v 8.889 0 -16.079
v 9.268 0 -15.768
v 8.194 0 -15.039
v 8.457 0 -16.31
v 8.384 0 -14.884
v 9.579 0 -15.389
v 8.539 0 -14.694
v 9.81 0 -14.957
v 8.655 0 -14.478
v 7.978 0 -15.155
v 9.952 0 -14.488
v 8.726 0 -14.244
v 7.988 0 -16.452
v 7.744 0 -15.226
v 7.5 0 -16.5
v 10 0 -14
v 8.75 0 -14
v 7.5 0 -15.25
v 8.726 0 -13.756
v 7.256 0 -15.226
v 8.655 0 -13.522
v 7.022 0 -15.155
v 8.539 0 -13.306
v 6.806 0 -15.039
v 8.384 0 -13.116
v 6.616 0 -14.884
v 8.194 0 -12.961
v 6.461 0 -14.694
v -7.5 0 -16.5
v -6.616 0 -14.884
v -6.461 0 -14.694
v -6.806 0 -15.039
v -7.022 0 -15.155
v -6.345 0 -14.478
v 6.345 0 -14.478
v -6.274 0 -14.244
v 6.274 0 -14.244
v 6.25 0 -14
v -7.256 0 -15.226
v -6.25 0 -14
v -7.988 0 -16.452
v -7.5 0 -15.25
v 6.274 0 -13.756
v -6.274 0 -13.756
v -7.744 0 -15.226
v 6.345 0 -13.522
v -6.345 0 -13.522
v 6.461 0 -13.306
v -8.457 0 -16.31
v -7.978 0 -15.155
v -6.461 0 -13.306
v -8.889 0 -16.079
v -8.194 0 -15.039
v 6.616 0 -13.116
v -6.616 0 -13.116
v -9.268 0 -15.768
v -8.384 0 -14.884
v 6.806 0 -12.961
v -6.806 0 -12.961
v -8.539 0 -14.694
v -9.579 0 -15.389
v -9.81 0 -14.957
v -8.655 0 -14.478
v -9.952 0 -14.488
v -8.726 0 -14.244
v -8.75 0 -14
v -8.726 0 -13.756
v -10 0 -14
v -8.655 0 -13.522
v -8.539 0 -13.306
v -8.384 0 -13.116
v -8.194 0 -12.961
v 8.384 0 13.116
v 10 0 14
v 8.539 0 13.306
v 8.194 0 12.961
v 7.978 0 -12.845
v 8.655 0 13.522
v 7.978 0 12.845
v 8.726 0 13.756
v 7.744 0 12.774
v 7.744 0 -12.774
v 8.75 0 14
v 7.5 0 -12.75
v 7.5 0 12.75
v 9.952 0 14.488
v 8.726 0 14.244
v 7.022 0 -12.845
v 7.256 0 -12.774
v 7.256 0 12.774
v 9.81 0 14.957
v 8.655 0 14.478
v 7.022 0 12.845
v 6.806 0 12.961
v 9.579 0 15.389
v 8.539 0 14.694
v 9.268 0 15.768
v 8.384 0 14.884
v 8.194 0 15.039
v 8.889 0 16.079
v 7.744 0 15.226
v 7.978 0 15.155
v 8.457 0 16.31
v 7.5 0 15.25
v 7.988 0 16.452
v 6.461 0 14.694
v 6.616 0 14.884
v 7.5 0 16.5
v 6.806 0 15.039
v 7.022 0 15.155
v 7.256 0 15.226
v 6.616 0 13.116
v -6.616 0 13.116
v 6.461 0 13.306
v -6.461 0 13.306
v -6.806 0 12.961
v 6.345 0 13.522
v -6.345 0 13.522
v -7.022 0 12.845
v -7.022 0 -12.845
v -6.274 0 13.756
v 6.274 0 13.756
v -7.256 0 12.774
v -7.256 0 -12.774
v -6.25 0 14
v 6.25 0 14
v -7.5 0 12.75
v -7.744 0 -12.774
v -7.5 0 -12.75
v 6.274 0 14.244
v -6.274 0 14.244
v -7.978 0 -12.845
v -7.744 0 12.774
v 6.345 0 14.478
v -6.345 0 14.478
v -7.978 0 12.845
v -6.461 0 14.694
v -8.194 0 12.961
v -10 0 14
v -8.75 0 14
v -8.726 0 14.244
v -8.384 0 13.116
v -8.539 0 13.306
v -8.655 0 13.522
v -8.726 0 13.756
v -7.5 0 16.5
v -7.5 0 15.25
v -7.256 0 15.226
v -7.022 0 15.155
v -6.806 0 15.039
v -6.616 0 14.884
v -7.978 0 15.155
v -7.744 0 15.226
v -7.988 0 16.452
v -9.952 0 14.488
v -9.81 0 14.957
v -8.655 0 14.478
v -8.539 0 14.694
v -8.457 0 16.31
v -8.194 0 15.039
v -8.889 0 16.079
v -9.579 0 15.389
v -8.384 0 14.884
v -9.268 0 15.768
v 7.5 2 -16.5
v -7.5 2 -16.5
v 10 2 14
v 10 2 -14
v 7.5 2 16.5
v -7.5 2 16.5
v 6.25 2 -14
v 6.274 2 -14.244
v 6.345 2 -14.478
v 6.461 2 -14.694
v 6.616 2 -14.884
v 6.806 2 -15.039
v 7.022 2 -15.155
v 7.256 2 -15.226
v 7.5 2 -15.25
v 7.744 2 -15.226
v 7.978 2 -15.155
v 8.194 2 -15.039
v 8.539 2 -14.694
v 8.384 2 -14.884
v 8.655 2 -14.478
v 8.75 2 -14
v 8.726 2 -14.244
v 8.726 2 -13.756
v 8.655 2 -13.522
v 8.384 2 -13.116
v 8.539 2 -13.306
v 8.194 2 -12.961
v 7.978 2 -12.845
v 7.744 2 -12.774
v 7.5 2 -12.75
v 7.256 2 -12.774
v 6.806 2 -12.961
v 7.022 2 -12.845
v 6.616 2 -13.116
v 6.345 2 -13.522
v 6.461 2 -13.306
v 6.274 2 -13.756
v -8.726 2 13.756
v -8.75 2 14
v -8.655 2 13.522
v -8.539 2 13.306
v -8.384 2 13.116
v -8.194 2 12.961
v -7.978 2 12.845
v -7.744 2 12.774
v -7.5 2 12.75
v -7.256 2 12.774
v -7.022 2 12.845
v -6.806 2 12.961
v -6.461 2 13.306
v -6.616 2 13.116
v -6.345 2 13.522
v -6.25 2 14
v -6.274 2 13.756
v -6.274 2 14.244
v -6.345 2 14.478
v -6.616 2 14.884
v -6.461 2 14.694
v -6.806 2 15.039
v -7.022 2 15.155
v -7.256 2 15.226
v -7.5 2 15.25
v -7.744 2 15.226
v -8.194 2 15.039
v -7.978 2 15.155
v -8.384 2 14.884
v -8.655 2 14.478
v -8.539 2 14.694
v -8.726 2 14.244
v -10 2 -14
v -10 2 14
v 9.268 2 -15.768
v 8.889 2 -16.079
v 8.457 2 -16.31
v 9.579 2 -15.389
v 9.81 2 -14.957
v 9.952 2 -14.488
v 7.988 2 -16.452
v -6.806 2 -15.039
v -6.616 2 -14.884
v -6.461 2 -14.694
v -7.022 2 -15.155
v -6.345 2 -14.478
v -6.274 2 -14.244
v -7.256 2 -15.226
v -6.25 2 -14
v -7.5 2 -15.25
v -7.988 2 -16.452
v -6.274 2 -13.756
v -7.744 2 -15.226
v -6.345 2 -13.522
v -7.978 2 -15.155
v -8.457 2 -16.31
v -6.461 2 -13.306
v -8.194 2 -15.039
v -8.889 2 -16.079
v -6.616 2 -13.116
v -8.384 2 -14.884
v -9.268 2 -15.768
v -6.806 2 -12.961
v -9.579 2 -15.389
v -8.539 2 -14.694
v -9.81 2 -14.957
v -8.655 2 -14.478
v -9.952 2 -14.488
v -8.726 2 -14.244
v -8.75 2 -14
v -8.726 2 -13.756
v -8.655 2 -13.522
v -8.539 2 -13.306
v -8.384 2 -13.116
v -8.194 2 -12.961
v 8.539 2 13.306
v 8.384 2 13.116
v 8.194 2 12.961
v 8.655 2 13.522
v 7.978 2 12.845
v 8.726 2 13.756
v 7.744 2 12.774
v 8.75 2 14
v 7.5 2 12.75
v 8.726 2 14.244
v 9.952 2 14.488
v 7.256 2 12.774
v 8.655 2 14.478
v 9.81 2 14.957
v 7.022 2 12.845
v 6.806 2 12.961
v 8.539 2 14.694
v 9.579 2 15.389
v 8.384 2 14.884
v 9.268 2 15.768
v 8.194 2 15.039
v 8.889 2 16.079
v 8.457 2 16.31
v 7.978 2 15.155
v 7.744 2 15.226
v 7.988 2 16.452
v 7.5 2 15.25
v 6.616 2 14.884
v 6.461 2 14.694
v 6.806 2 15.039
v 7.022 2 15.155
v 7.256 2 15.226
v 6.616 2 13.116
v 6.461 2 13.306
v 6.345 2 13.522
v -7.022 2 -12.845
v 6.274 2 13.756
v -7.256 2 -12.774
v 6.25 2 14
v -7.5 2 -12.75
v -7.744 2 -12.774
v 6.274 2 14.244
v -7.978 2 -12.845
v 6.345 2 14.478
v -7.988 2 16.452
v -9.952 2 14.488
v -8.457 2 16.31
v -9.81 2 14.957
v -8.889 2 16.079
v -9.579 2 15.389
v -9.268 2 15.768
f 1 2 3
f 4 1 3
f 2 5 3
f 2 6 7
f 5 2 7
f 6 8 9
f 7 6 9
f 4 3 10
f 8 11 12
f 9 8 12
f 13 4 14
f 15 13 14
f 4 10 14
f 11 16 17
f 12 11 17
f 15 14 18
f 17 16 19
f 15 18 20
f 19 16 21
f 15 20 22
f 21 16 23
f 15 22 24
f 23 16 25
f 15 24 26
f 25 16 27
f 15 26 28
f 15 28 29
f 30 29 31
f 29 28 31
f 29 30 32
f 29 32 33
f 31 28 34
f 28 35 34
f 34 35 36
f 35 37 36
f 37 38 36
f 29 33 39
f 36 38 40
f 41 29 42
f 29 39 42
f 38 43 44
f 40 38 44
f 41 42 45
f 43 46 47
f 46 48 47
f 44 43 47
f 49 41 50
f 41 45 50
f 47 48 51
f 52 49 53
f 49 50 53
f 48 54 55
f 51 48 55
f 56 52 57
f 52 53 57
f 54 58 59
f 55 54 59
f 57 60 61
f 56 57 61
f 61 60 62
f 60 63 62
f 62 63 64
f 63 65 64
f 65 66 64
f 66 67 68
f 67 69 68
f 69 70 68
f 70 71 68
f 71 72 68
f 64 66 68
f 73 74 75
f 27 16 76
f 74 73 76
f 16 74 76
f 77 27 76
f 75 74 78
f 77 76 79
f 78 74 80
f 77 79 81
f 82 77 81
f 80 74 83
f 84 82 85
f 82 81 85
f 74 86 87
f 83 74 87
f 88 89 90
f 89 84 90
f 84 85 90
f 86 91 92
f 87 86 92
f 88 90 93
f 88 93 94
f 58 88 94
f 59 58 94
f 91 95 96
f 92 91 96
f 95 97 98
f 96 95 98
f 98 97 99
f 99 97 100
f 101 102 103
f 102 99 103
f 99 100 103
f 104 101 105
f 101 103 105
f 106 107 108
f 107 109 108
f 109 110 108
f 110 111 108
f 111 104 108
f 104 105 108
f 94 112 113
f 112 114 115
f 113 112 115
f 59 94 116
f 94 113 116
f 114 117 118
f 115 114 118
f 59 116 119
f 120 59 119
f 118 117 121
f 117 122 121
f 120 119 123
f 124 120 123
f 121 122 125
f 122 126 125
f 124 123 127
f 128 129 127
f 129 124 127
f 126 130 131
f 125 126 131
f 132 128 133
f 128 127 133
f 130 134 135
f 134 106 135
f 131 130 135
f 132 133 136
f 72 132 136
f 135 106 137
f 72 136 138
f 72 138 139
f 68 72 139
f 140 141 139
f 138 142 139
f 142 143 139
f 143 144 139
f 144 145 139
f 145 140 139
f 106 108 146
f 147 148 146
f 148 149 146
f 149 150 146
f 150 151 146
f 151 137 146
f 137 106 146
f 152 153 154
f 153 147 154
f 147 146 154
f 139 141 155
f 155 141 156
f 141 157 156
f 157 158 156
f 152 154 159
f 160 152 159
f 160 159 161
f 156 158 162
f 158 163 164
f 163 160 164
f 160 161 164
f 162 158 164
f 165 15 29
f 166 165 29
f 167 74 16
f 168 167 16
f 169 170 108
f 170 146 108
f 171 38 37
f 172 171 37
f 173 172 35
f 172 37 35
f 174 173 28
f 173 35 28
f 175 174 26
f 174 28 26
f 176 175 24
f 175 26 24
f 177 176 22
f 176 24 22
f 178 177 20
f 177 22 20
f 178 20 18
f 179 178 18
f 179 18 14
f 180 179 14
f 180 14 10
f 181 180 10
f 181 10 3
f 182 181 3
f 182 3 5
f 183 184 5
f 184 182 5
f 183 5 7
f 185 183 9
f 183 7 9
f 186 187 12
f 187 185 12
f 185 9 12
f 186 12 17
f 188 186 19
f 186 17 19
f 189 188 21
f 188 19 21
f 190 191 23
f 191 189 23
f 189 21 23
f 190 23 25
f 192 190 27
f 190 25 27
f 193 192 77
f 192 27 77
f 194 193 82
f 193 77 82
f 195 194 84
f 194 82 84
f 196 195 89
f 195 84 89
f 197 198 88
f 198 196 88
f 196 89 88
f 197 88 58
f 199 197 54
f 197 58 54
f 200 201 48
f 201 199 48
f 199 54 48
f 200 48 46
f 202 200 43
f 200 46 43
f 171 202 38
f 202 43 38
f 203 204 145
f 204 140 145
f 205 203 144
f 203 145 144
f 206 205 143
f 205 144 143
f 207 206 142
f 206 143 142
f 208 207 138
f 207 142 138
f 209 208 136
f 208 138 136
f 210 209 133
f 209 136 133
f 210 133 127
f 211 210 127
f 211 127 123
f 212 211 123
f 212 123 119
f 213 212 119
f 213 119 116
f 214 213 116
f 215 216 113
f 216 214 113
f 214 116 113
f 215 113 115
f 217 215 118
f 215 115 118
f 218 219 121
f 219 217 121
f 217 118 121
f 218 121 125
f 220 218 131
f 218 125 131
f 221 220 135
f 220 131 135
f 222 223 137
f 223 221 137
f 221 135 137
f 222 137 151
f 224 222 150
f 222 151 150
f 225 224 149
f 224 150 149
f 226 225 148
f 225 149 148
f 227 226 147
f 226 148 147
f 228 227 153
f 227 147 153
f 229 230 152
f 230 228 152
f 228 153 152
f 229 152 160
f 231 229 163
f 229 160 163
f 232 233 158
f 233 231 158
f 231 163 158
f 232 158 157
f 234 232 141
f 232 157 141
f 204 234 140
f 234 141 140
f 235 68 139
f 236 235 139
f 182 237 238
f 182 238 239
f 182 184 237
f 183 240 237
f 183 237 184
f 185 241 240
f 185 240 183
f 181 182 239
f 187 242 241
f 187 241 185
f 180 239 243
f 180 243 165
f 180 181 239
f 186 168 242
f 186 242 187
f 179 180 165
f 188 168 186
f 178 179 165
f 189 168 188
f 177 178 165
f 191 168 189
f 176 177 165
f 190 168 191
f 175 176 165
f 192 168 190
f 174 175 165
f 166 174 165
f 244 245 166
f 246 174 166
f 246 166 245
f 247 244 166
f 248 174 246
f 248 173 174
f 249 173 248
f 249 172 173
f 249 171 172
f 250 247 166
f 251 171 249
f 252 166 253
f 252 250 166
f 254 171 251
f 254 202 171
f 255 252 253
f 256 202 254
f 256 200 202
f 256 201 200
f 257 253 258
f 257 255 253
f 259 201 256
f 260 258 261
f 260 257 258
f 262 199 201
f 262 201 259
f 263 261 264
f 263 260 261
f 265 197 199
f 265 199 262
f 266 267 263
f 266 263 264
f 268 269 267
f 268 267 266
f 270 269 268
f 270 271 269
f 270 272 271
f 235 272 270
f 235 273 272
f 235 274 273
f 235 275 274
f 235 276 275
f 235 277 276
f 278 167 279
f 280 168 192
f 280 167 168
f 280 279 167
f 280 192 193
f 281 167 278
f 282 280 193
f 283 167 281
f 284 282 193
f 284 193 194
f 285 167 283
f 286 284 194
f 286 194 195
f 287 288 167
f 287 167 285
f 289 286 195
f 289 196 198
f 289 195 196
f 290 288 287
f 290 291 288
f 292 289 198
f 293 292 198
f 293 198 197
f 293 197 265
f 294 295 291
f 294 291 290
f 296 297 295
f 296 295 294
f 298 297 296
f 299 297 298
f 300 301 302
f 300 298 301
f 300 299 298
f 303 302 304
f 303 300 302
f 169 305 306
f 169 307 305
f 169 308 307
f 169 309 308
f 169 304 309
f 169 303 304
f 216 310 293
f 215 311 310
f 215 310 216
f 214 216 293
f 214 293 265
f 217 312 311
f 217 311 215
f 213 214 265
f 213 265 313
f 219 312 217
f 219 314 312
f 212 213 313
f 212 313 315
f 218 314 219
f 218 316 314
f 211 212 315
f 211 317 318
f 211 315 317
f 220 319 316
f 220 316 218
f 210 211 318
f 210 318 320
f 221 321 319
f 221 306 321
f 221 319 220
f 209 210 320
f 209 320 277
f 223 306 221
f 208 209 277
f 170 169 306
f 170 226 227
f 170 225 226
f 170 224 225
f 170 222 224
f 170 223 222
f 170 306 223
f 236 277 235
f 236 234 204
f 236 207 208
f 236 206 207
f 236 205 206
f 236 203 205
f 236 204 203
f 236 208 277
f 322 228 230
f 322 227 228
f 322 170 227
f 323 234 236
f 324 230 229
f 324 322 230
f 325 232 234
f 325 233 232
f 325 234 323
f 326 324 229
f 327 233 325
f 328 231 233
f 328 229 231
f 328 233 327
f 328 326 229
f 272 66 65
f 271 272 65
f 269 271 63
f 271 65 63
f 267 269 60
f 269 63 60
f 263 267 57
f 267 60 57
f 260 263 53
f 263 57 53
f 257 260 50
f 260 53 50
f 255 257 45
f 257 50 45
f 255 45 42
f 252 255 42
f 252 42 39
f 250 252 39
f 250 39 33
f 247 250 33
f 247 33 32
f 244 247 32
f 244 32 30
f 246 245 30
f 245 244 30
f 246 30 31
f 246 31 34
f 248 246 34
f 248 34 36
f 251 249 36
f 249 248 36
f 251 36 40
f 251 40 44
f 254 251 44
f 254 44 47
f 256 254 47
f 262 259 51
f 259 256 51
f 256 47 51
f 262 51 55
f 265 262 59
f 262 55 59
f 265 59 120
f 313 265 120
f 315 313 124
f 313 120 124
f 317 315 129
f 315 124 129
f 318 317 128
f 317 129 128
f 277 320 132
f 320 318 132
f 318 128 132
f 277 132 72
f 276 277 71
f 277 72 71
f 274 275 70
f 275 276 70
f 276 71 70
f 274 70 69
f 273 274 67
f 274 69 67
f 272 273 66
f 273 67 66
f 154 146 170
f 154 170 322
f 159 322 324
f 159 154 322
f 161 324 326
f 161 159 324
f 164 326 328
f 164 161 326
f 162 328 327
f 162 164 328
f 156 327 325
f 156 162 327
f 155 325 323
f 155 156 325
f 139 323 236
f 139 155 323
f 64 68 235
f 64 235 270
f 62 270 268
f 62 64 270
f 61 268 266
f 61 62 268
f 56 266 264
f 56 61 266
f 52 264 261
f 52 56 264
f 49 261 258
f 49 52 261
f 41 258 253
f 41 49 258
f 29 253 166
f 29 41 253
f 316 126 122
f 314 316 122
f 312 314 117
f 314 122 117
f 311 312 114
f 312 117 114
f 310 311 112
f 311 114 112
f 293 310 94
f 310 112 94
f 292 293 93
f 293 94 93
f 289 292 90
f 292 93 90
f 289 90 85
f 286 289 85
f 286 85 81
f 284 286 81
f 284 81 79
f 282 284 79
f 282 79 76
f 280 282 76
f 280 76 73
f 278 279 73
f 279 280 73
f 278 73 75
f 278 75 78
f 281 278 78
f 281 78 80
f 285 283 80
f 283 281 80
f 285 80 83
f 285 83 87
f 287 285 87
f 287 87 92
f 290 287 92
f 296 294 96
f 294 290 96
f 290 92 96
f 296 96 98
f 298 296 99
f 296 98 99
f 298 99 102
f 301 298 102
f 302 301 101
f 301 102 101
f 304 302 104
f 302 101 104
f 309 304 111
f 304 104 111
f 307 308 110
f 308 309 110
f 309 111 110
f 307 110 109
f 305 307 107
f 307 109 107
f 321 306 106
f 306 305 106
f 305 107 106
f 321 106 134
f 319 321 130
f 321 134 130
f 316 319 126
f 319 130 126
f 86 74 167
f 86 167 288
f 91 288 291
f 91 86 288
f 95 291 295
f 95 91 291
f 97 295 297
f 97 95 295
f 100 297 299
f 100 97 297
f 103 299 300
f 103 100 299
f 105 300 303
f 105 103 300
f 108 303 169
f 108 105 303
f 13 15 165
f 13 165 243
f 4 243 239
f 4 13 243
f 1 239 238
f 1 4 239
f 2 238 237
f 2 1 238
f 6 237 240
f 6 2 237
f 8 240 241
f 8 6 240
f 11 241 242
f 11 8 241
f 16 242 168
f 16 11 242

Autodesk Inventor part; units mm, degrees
ref_plane "YZ Plane" through (0, 0, 0) normal (1, 0, 0) x (0, 1, 0)
ref_plane "XZ Plane" through (0, 0, 0) normal (0, 1, 0) x (-1, 0, 0)
ref_plane "XY Plane" through (0, 0, 0) normal (0, 0, 1) x (1, 0, 0)
sketch "Sketch1" plane through (0, 0, 0) normal (0, 1, 0) x (-1, 0, 0)
  line L0 (-10, 14) -> (-10, -14)
  line L1 (-7.5, -16.5) -> (7.5, -16.5)
  line L2 (10, -14) -> (10, 14)
  line L3 (7.5, 16.5) -> (-7.5, 16.5)
  line L4 (-10, 16.5) -> (10, -16.5) construction
  line L5 (-10, -16.5) -> (10, 16.5) construction
  arc A0 (10, 14) -> (7.5, 16.5) centre (7.5, 14) ccw
  arc A1 (7.5, -16.5) -> (10, -14) centre (7.5, -14) ccw
  arc A2 (-10, -14) -> (-7.5, -16.5) centre (-7.5, -14) ccw
  arc A3 (-7.5, 16.5) -> (-10, 14) centre (-7.5, 14) ccw
  circle A4 centre (7.5, 14) radius 1.25
  circle A5 centre (-7.5, 14) radius 1.25
  circle A6 centre (-7.5, -14) radius 1.25
  circle A7 centre (7.5, -14) radius 1.25
  point P0 (0, 0)
  dimension "d0" = 33
  dimension "d1" = 20
  dimension "d2" = 2.5
  dimension "d3" = 2.5
  dimension "d4" = 2.5
  dimension "d5" = 2.5
  dimension "d6" = 2.5
extrude "Extrusion1" add sketch "Sketch1" along normal blind 2
sketch "Sketch2" plane through (0, 2, 0) normal (0, 1, 0) x (1, 0, 0)
  line L0 (-17.9692, -32.7187) -> (-17.5216, 33.3599) construction
  line L1 (-17.5216, 33.3599) -> (32.0714, 33.0239) construction
  line L2 (32.0714, 33.0239) -> (31.6238, -33.0546) construction
  line L3 (31.6238, -33.0546) -> (-17.9692, -32.7187) construction
  circle A0 centre (-7.5, 14) radius 1.25 projected
  circle A1 centre (7.5, 14) radius 1.25 projected
  circle A2 centre (7.5, -14) radius 1.25 projected
  circle A3 centre (-7.5, -14) radius 1.25 projected
  line L4 (-10, 14) -> (-10, -14) projected
  arc A4 (-10, -14) -> (-7.5, -16.5) centre (-7.5, -14) ccw projected
  line L5 (-7.5, -16.5) -> (7.5, -16.5) projected
  arc A5 (7.5, -16.5) -> (10, -14) centre (7.5, -14) ccw projected
  line L6 (10, -14) -> (10, 14) projected
  arc A6 (10, 14) -> (7.5, 16.5) centre (7.5, 14) ccw projected
  line L7 (7.5, 16.5) -> (-7.5, 16.5) projected
  arc A7 (-7.5, 16.5) -> (-10, 14) centre (-7.5, 14) ccw projected
  point P0 (0, 0)
decal "Decal1"
sketch "Sketch3" plane through (0, 0, 0) normal (0, -1, 0) x (1, 0, 0)
  circle A0 centre (-7.5, -14) radius 1.25 projected
  circle A1 centre (7.5, -14) radius 1.25 projected
  circle A2 centre (7.5, 14) radius 1.25 projected
  circle A3 centre (-7.5, 14) radius 1.25 projected
  line L0 (-10, 14) -> (-10, -14) projected
  arc A4 (-10, -14) -> (-7.5, -16.5) centre (-7.5, -14) ccw projected
  line L1 (-7.5, -16.5) -> (7.5, -16.5) projected
  arc A5 (7.5, -16.5) -> (10, -14) centre (7.5, -14) ccw projected
  line L2 (10, -14) -> (10, 14) projected
  arc A6 (10, 14) -> (7.5, 16.5) centre (7.5, 14) ccw projected
  line L3 (7.5, 16.5) -> (-7.5, 16.5) projected
  arc A7 (-7.5, 16.5) -> (-10, 14) centre (-7.5, 14) ccw projected
  line L4 (-25.6164, -20.5771) -> (-25.6164, 49.1548) construction
  line L5 (-25.6164, 49.1548) -> (26.7185, 49.1548) construction
  line L6 (26.7185, 49.1548) -> (26.7185, -20.5771) construction
  line L7 (26.7185, -20.5771) -> (-25.6164, -20.5771) construction
  line L8 (-7.5, 16.5) -> (7.5, 16.5) projected
  line L9 (0, 16.5) -> (0, 0)
decal "Decal2"
properties part number "Adafruit Compass"
